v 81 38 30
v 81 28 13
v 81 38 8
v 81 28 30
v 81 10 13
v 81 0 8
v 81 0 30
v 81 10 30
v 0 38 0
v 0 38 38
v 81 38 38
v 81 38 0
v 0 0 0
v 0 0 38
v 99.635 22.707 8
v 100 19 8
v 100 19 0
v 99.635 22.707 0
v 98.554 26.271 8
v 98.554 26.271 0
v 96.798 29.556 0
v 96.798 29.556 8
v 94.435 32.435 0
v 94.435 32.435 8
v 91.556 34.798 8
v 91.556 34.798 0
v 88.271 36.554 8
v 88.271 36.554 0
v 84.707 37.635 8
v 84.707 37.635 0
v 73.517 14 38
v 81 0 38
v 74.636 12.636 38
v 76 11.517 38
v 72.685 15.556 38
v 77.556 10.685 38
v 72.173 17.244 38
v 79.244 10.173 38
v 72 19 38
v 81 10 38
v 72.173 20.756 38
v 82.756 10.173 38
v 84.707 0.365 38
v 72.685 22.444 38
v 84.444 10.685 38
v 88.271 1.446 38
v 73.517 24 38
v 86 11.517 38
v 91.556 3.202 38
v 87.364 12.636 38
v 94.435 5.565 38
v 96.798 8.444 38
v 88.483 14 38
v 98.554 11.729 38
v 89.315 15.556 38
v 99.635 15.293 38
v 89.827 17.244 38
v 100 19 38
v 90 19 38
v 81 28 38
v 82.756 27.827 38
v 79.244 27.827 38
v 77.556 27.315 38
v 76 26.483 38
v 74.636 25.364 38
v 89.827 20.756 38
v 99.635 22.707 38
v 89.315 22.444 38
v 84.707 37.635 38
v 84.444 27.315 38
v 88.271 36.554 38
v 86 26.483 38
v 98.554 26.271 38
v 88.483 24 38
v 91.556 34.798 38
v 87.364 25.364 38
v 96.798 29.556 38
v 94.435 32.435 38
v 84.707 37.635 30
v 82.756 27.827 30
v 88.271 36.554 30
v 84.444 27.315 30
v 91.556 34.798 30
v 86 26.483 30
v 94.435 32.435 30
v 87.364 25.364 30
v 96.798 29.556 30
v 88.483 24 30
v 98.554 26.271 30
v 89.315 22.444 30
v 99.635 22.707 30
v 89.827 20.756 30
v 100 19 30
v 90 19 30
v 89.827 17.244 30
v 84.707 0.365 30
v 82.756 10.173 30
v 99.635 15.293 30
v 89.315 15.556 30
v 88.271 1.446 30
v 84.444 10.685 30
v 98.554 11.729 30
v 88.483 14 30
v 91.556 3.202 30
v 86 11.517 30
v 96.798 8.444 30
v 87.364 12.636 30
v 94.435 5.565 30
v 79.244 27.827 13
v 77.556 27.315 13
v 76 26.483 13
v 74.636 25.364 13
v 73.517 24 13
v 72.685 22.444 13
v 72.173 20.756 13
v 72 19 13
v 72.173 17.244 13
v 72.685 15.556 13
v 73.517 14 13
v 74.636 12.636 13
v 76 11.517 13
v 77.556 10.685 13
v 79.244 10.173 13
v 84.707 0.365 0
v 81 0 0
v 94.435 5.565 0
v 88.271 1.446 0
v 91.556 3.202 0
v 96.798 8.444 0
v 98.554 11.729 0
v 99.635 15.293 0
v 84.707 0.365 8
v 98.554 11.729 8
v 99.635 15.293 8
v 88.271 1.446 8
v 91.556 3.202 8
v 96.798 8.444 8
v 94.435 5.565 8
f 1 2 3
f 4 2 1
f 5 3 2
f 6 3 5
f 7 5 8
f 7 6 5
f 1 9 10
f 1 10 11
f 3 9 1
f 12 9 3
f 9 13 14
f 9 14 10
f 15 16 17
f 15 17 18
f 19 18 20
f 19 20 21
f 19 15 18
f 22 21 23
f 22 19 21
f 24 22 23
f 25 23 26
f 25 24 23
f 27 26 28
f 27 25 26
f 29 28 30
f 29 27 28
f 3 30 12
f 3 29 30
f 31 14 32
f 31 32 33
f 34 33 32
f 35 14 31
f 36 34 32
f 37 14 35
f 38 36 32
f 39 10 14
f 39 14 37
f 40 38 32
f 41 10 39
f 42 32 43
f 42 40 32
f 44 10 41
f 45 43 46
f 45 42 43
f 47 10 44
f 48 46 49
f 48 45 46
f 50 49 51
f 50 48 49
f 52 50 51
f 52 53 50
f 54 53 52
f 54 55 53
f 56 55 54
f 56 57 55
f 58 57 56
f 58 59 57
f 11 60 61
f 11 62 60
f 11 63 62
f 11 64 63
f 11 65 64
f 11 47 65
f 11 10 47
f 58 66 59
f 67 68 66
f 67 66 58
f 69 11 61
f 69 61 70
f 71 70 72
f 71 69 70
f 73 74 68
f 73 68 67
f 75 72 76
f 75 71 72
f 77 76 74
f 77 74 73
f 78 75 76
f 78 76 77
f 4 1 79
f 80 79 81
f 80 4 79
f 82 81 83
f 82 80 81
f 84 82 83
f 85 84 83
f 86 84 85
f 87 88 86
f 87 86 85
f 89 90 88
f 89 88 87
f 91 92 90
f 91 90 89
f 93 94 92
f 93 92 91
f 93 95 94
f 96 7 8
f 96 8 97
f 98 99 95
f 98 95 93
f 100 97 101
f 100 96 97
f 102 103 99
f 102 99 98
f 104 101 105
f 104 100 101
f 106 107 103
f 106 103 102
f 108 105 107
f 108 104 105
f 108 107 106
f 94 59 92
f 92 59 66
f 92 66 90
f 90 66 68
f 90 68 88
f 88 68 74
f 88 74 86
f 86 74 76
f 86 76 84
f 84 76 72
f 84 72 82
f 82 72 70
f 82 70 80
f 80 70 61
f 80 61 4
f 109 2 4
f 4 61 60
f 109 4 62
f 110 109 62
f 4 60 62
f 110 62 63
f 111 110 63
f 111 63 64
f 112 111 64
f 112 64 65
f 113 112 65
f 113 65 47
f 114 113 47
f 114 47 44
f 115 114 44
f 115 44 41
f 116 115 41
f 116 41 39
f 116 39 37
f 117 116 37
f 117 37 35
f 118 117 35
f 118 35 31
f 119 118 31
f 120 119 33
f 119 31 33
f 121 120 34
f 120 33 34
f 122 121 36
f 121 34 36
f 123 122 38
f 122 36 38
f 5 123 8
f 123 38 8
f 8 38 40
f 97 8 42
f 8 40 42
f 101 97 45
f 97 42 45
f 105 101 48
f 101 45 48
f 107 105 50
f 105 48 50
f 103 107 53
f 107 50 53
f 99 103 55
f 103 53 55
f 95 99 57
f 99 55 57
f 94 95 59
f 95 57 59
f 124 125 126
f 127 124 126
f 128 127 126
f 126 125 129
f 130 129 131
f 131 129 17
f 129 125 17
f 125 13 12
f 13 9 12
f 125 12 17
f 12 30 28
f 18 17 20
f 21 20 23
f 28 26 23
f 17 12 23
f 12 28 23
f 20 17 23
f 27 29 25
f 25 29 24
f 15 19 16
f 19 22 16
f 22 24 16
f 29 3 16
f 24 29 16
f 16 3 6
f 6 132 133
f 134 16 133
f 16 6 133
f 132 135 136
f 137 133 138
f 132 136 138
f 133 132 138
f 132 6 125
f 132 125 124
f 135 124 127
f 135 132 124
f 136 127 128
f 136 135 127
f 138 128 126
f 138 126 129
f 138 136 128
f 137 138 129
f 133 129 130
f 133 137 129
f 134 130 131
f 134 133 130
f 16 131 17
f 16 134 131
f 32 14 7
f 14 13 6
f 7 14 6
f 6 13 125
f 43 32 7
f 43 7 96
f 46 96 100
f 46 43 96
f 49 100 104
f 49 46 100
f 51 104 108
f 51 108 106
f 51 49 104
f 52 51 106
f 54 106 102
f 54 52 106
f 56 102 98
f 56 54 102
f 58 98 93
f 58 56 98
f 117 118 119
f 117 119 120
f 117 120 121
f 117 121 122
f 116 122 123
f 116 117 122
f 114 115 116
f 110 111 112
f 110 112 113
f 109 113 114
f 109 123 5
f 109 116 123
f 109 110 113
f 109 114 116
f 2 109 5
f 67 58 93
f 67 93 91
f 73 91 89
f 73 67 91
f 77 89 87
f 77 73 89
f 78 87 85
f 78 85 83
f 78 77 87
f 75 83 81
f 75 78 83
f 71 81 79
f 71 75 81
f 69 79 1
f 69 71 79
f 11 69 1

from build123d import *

# Parameters (mm, degrees)
F0_W     = 100
F0_H     = 38
F1_DEPTH = 38
F2_R     = 18.99999
F3_R     = 9
F4_DEPTH = 25
F5_W     = 20.3221625665
F5_H     = 22
F6_DEPTH = 38.001


# Not quite as in the source:
# - a fillet or chamfer is up to 0.001 mm smaller than in the source, because OpenCascade refuses the exact size


with BuildPart() as f1:
    # F0 (on Top) → F1 (new body)
    with BuildSketch(Plane.XY):
        with Locations((50, 19)):
            Rectangle(F0_W, F0_H)
    extrude(amount=F1_DEPTH)

    # F2 (radius 19 in the source; OpenCascade refuses exactly that, so slightly less here)
    f2_edges = [f1.edges().sort_by_distance(p)[0] for p in [
        (100, 0, 19),
        (100, 38, 19),
    ]]
    fillet(f2_edges, radius=F2_R)

    # F3 (on face) → F4 (cut)
    with BuildSketch(Plane.XY.offset(38)):
        with Locations((81, 19)):
            Circle(F3_R)
    extrude(amount=-F4_DEPTH, mode=Mode.SUBTRACT)

    # F5 (on face) → F6 (cut, through all)
    with BuildSketch(Plane.XZ):
        with Locations((91.1610912833, 19)):
            Rectangle(F5_W, F5_H)
    extrude(amount=-F6_DEPTH, mode=Mode.SUBTRACT)


solid = f1.part
